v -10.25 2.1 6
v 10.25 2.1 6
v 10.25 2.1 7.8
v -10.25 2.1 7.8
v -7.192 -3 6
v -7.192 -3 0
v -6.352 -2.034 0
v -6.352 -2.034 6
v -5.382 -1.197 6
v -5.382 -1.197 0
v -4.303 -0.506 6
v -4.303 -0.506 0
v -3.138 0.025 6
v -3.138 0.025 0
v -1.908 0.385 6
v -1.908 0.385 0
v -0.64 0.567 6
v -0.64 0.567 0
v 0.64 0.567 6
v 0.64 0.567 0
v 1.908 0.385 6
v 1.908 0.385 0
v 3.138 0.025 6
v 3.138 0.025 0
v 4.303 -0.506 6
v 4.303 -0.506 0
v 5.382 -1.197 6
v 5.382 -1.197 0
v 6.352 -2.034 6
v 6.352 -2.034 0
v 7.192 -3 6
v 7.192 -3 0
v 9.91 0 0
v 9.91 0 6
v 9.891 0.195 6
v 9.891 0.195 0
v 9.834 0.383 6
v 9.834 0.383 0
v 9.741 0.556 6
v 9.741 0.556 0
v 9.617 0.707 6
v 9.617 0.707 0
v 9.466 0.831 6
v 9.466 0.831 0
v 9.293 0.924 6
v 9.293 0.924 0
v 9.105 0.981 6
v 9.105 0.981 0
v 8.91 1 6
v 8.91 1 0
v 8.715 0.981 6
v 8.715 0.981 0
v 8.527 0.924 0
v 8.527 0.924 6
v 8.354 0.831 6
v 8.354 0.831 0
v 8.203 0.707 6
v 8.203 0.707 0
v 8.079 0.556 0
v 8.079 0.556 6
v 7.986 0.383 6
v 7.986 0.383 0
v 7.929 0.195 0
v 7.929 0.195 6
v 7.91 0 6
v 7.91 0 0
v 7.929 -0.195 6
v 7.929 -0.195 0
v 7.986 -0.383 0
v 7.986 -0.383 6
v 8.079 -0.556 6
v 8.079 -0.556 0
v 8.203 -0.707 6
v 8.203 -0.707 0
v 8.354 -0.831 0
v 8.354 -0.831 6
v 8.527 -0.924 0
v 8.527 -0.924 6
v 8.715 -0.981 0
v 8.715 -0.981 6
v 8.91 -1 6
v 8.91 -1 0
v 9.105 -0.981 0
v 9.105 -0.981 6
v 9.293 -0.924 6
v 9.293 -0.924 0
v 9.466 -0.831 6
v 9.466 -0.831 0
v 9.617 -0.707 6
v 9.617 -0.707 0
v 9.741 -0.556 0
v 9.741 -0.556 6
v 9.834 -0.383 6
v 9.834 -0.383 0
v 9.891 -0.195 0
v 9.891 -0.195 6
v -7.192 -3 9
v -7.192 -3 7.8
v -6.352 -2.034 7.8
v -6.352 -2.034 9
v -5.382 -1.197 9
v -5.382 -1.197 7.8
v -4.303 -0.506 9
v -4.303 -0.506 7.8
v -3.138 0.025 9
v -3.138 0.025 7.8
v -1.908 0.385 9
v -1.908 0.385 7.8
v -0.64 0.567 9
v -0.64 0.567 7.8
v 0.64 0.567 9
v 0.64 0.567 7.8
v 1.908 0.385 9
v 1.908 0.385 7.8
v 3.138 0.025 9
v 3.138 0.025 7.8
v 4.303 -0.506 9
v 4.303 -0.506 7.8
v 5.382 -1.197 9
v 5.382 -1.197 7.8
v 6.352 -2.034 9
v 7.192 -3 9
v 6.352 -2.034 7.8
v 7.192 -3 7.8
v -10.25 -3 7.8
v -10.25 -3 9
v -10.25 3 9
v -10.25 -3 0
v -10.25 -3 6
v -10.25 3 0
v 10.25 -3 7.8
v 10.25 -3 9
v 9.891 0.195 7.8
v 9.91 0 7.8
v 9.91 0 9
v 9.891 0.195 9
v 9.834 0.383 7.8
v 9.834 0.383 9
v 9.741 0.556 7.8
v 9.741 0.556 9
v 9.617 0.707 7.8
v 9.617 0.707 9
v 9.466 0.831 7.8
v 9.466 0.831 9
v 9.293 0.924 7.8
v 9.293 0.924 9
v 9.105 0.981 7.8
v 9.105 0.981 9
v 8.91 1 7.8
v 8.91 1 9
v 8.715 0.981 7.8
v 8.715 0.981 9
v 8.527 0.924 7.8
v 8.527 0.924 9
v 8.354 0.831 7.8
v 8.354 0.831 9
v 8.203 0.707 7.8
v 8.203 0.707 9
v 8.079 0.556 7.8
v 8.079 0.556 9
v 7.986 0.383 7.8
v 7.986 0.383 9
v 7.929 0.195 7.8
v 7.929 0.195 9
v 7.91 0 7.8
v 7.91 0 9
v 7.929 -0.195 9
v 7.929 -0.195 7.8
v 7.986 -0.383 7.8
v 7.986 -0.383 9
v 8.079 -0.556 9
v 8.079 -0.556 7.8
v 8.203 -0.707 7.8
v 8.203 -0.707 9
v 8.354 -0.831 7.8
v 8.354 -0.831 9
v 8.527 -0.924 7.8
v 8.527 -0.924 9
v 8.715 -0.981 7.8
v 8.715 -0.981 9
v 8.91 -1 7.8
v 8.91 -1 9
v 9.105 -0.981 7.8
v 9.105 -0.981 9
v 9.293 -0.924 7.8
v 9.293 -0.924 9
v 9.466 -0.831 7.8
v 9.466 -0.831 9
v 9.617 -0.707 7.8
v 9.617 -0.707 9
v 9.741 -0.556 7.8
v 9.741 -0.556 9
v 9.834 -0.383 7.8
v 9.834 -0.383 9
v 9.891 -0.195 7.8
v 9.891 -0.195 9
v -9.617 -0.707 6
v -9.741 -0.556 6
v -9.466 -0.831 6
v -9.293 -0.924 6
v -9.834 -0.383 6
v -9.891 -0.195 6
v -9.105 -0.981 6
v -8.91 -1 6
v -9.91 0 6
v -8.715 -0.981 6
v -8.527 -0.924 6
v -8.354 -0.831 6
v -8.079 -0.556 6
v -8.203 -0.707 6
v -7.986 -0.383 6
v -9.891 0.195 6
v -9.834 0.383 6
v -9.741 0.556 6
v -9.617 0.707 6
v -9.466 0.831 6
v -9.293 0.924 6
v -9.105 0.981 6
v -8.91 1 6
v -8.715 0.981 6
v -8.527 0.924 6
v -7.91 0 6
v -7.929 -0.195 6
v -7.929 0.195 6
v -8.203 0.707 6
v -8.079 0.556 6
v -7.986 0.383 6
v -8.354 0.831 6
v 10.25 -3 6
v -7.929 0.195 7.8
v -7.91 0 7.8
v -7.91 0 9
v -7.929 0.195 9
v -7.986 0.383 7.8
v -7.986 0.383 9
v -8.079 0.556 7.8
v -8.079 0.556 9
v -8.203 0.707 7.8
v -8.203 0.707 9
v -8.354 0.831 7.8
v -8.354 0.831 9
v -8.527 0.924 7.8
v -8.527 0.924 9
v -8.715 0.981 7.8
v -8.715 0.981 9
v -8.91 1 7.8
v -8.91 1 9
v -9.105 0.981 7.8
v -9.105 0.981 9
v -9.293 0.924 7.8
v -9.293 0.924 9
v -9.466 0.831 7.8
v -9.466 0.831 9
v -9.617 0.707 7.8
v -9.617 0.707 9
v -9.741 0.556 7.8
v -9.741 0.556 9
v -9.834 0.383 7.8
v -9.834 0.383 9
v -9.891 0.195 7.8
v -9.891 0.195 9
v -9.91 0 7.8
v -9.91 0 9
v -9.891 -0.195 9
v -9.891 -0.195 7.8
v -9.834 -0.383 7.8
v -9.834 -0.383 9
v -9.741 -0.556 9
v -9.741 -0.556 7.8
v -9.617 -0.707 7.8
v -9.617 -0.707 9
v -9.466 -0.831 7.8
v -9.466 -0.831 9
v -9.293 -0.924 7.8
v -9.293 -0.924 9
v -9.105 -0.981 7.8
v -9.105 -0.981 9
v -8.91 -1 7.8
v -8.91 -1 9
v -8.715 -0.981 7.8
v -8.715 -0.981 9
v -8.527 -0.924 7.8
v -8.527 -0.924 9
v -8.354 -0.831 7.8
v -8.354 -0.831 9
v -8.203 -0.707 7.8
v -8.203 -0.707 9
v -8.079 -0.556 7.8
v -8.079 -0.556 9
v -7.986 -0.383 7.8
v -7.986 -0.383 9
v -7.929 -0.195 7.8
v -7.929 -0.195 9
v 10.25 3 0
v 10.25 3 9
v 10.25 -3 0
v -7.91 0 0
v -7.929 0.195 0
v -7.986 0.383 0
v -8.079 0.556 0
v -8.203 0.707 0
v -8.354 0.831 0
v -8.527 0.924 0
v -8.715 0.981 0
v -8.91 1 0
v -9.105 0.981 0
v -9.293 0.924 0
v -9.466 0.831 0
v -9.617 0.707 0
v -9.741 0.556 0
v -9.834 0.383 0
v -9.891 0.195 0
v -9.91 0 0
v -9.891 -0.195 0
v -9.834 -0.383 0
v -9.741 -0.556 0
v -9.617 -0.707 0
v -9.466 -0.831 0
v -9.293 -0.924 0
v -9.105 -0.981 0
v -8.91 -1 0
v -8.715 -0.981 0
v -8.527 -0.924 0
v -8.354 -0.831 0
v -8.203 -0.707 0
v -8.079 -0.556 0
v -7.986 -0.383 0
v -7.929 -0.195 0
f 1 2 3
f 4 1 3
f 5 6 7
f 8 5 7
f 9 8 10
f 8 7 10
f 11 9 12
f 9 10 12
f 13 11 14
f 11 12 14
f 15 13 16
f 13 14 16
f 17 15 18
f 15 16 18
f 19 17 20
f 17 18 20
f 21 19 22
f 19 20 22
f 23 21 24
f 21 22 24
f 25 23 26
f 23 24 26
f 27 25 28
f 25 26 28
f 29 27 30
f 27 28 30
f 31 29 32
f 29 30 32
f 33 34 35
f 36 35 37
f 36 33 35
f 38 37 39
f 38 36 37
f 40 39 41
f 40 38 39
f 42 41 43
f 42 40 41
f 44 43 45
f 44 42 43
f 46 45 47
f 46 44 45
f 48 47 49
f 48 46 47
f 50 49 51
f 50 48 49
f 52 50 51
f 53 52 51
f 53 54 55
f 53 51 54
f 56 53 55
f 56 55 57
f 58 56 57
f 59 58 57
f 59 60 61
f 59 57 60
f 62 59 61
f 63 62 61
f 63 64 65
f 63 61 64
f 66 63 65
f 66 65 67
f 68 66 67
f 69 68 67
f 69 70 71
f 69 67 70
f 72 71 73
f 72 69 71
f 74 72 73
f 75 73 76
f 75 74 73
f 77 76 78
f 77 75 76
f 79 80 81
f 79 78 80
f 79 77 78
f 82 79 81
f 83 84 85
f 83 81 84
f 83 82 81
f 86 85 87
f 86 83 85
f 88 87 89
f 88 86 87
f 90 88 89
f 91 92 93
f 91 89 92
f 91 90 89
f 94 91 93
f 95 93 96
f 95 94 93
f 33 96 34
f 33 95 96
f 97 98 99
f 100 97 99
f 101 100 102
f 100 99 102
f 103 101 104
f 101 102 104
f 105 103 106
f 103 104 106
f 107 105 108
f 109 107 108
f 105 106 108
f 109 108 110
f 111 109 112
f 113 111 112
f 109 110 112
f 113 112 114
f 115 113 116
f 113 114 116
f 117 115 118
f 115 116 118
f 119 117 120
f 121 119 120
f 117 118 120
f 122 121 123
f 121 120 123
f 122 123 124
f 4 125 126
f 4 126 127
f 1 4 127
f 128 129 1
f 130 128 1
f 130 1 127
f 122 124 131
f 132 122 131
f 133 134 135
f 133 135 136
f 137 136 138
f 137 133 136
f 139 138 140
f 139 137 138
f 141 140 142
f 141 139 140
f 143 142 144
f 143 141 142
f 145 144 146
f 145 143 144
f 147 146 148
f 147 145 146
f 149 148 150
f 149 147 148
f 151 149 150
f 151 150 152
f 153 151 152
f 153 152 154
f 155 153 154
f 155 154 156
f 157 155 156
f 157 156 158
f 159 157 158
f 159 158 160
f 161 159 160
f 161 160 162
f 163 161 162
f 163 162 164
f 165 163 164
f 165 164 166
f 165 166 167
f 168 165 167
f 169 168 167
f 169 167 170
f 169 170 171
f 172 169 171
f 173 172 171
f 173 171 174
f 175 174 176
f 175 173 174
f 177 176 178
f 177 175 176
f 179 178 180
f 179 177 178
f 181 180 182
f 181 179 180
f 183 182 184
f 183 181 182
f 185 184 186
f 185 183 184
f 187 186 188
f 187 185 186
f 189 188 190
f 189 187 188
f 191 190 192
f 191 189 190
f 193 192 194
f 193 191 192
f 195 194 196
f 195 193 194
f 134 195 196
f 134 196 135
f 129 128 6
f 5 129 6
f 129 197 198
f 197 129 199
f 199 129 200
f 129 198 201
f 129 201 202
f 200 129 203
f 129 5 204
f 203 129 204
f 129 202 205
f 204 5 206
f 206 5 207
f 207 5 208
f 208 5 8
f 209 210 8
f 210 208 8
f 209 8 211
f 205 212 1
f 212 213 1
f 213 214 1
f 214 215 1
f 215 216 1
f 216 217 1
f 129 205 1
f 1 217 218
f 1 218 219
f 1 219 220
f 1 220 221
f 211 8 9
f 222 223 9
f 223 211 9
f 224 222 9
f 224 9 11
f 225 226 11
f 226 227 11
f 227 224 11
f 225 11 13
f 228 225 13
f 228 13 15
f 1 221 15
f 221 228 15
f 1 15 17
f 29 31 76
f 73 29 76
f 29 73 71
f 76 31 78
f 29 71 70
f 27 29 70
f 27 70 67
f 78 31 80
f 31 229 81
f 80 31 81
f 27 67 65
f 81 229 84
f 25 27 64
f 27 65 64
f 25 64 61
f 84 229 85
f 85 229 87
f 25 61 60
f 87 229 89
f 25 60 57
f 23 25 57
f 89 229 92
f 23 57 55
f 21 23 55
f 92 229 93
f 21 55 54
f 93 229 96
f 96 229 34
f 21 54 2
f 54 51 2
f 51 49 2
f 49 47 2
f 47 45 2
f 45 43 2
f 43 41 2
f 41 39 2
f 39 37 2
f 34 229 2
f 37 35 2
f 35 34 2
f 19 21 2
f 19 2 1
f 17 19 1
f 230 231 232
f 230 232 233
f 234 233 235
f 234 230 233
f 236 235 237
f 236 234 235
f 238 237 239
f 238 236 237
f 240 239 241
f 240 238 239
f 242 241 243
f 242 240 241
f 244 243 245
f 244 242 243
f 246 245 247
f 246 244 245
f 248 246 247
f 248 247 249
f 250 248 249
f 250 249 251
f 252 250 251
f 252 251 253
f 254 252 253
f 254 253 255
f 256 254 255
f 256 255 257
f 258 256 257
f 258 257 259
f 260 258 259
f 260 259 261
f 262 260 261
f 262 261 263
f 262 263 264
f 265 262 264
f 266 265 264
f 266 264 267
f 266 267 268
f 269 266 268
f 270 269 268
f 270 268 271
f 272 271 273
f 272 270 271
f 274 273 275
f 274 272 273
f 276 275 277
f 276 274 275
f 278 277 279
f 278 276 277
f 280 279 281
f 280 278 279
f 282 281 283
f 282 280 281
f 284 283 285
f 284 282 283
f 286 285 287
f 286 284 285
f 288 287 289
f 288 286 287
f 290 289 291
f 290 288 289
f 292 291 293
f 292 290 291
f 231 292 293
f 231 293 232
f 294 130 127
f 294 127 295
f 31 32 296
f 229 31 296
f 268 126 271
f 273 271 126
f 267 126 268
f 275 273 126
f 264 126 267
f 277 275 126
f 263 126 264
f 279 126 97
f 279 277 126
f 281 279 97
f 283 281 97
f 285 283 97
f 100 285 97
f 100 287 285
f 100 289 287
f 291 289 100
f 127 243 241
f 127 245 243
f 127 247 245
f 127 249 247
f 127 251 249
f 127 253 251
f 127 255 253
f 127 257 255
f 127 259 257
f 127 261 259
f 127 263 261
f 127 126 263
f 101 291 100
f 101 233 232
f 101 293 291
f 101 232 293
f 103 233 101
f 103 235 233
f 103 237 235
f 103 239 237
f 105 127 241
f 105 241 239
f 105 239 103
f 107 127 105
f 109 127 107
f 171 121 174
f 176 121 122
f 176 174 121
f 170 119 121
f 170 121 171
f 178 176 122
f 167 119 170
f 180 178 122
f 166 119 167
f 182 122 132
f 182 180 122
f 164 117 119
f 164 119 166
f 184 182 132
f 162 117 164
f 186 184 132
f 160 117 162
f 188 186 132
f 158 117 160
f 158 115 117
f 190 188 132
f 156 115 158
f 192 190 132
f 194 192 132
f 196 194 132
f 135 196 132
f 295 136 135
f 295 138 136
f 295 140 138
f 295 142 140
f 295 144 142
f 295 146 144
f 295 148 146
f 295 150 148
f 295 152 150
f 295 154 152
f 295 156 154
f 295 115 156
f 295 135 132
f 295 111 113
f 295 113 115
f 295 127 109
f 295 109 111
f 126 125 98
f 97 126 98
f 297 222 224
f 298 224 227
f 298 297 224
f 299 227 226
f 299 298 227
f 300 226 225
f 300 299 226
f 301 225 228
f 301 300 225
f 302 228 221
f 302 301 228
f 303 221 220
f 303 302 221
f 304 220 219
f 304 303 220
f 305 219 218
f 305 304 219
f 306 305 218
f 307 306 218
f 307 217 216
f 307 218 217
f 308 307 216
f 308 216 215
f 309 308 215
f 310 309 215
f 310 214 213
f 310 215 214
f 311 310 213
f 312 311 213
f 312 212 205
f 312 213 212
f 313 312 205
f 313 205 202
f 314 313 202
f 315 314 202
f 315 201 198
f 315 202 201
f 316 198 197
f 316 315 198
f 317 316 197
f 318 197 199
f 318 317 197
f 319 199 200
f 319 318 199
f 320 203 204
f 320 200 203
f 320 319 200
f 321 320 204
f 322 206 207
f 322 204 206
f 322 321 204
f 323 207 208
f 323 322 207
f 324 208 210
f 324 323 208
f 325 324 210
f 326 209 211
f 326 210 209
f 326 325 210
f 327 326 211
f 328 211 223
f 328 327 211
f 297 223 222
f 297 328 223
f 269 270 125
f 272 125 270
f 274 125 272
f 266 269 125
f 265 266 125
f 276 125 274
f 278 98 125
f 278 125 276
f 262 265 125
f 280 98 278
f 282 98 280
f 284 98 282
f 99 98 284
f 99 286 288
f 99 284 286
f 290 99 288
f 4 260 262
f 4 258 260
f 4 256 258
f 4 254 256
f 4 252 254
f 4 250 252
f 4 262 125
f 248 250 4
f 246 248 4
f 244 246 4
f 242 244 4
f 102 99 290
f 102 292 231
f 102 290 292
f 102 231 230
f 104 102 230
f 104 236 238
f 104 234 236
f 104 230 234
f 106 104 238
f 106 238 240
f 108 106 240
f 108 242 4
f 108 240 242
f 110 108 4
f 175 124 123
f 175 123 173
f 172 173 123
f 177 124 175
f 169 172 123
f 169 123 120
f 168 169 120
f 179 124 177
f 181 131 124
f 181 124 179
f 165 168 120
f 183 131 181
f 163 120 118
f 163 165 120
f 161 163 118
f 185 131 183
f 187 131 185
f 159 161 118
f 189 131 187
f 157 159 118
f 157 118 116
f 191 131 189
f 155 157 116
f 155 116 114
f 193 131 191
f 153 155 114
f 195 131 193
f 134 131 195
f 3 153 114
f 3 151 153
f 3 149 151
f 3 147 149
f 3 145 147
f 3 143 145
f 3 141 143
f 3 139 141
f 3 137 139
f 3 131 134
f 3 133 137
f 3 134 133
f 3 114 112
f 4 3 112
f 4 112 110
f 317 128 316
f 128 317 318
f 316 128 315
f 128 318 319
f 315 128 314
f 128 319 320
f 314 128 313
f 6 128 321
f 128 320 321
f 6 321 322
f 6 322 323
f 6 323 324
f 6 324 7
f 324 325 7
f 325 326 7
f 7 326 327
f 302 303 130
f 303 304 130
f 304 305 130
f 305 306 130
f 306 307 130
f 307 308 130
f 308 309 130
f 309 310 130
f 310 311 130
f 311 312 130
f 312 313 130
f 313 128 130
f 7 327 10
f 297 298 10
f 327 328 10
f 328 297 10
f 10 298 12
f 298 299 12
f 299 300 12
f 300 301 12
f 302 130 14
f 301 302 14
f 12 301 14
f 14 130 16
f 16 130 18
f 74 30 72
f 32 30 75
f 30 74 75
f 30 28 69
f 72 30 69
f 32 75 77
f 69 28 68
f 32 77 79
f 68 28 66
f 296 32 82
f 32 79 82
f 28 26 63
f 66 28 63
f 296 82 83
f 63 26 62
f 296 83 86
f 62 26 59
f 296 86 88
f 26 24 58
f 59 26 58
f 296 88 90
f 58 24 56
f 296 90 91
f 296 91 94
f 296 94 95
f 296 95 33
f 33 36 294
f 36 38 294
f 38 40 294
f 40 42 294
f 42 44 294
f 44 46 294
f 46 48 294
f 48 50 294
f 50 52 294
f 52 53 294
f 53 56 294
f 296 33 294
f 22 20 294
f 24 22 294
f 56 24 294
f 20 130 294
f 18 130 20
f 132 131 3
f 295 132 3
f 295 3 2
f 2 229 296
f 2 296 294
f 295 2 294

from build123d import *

# Parameters (mm, degrees)
F0_W     = 20.5
F0_H     = 6
F0_R     = 1
F1_DEPTH = 9
F2_W     = 5.1
F2_H     = 1.8
F3_DEPTH = 20.501
F4_R     = 9
F5_DEPTH = 25


with BuildPart() as f1:
    # F0 (on Top) → F1 (new body)
    with BuildSketch(Plane.XY):
        Rectangle(F0_W, F0_H)
        with Locations((-8.91, 0)):
            Circle(F0_R, mode=Mode.SUBTRACT)
        with Locations((8.91, 0)):
            Circle(F0_R, mode=Mode.SUBTRACT)
    extrude(amount=F1_DEPTH)

    # F2 (on face) → F3 (cut, through all)
    with BuildSketch(Plane.YZ.offset(10.25)):
        with Locations((-0.45, 6.9)):
            Rectangle(F2_W, F2_H)
    extrude(amount=-F3_DEPTH, mode=Mode.SUBTRACT)

    # F4 (on face) → F5 (cut)
    with BuildSketch(Plane(origin=(0, 0, 0), x_dir=(1, 0, 0), z_dir=(0, 0, -1))):
        with Locations((0, 8.41)):
            Circle(F4_R)
    extrude(amount=-F5_DEPTH, mode=Mode.SUBTRACT)


solid = f1.part
